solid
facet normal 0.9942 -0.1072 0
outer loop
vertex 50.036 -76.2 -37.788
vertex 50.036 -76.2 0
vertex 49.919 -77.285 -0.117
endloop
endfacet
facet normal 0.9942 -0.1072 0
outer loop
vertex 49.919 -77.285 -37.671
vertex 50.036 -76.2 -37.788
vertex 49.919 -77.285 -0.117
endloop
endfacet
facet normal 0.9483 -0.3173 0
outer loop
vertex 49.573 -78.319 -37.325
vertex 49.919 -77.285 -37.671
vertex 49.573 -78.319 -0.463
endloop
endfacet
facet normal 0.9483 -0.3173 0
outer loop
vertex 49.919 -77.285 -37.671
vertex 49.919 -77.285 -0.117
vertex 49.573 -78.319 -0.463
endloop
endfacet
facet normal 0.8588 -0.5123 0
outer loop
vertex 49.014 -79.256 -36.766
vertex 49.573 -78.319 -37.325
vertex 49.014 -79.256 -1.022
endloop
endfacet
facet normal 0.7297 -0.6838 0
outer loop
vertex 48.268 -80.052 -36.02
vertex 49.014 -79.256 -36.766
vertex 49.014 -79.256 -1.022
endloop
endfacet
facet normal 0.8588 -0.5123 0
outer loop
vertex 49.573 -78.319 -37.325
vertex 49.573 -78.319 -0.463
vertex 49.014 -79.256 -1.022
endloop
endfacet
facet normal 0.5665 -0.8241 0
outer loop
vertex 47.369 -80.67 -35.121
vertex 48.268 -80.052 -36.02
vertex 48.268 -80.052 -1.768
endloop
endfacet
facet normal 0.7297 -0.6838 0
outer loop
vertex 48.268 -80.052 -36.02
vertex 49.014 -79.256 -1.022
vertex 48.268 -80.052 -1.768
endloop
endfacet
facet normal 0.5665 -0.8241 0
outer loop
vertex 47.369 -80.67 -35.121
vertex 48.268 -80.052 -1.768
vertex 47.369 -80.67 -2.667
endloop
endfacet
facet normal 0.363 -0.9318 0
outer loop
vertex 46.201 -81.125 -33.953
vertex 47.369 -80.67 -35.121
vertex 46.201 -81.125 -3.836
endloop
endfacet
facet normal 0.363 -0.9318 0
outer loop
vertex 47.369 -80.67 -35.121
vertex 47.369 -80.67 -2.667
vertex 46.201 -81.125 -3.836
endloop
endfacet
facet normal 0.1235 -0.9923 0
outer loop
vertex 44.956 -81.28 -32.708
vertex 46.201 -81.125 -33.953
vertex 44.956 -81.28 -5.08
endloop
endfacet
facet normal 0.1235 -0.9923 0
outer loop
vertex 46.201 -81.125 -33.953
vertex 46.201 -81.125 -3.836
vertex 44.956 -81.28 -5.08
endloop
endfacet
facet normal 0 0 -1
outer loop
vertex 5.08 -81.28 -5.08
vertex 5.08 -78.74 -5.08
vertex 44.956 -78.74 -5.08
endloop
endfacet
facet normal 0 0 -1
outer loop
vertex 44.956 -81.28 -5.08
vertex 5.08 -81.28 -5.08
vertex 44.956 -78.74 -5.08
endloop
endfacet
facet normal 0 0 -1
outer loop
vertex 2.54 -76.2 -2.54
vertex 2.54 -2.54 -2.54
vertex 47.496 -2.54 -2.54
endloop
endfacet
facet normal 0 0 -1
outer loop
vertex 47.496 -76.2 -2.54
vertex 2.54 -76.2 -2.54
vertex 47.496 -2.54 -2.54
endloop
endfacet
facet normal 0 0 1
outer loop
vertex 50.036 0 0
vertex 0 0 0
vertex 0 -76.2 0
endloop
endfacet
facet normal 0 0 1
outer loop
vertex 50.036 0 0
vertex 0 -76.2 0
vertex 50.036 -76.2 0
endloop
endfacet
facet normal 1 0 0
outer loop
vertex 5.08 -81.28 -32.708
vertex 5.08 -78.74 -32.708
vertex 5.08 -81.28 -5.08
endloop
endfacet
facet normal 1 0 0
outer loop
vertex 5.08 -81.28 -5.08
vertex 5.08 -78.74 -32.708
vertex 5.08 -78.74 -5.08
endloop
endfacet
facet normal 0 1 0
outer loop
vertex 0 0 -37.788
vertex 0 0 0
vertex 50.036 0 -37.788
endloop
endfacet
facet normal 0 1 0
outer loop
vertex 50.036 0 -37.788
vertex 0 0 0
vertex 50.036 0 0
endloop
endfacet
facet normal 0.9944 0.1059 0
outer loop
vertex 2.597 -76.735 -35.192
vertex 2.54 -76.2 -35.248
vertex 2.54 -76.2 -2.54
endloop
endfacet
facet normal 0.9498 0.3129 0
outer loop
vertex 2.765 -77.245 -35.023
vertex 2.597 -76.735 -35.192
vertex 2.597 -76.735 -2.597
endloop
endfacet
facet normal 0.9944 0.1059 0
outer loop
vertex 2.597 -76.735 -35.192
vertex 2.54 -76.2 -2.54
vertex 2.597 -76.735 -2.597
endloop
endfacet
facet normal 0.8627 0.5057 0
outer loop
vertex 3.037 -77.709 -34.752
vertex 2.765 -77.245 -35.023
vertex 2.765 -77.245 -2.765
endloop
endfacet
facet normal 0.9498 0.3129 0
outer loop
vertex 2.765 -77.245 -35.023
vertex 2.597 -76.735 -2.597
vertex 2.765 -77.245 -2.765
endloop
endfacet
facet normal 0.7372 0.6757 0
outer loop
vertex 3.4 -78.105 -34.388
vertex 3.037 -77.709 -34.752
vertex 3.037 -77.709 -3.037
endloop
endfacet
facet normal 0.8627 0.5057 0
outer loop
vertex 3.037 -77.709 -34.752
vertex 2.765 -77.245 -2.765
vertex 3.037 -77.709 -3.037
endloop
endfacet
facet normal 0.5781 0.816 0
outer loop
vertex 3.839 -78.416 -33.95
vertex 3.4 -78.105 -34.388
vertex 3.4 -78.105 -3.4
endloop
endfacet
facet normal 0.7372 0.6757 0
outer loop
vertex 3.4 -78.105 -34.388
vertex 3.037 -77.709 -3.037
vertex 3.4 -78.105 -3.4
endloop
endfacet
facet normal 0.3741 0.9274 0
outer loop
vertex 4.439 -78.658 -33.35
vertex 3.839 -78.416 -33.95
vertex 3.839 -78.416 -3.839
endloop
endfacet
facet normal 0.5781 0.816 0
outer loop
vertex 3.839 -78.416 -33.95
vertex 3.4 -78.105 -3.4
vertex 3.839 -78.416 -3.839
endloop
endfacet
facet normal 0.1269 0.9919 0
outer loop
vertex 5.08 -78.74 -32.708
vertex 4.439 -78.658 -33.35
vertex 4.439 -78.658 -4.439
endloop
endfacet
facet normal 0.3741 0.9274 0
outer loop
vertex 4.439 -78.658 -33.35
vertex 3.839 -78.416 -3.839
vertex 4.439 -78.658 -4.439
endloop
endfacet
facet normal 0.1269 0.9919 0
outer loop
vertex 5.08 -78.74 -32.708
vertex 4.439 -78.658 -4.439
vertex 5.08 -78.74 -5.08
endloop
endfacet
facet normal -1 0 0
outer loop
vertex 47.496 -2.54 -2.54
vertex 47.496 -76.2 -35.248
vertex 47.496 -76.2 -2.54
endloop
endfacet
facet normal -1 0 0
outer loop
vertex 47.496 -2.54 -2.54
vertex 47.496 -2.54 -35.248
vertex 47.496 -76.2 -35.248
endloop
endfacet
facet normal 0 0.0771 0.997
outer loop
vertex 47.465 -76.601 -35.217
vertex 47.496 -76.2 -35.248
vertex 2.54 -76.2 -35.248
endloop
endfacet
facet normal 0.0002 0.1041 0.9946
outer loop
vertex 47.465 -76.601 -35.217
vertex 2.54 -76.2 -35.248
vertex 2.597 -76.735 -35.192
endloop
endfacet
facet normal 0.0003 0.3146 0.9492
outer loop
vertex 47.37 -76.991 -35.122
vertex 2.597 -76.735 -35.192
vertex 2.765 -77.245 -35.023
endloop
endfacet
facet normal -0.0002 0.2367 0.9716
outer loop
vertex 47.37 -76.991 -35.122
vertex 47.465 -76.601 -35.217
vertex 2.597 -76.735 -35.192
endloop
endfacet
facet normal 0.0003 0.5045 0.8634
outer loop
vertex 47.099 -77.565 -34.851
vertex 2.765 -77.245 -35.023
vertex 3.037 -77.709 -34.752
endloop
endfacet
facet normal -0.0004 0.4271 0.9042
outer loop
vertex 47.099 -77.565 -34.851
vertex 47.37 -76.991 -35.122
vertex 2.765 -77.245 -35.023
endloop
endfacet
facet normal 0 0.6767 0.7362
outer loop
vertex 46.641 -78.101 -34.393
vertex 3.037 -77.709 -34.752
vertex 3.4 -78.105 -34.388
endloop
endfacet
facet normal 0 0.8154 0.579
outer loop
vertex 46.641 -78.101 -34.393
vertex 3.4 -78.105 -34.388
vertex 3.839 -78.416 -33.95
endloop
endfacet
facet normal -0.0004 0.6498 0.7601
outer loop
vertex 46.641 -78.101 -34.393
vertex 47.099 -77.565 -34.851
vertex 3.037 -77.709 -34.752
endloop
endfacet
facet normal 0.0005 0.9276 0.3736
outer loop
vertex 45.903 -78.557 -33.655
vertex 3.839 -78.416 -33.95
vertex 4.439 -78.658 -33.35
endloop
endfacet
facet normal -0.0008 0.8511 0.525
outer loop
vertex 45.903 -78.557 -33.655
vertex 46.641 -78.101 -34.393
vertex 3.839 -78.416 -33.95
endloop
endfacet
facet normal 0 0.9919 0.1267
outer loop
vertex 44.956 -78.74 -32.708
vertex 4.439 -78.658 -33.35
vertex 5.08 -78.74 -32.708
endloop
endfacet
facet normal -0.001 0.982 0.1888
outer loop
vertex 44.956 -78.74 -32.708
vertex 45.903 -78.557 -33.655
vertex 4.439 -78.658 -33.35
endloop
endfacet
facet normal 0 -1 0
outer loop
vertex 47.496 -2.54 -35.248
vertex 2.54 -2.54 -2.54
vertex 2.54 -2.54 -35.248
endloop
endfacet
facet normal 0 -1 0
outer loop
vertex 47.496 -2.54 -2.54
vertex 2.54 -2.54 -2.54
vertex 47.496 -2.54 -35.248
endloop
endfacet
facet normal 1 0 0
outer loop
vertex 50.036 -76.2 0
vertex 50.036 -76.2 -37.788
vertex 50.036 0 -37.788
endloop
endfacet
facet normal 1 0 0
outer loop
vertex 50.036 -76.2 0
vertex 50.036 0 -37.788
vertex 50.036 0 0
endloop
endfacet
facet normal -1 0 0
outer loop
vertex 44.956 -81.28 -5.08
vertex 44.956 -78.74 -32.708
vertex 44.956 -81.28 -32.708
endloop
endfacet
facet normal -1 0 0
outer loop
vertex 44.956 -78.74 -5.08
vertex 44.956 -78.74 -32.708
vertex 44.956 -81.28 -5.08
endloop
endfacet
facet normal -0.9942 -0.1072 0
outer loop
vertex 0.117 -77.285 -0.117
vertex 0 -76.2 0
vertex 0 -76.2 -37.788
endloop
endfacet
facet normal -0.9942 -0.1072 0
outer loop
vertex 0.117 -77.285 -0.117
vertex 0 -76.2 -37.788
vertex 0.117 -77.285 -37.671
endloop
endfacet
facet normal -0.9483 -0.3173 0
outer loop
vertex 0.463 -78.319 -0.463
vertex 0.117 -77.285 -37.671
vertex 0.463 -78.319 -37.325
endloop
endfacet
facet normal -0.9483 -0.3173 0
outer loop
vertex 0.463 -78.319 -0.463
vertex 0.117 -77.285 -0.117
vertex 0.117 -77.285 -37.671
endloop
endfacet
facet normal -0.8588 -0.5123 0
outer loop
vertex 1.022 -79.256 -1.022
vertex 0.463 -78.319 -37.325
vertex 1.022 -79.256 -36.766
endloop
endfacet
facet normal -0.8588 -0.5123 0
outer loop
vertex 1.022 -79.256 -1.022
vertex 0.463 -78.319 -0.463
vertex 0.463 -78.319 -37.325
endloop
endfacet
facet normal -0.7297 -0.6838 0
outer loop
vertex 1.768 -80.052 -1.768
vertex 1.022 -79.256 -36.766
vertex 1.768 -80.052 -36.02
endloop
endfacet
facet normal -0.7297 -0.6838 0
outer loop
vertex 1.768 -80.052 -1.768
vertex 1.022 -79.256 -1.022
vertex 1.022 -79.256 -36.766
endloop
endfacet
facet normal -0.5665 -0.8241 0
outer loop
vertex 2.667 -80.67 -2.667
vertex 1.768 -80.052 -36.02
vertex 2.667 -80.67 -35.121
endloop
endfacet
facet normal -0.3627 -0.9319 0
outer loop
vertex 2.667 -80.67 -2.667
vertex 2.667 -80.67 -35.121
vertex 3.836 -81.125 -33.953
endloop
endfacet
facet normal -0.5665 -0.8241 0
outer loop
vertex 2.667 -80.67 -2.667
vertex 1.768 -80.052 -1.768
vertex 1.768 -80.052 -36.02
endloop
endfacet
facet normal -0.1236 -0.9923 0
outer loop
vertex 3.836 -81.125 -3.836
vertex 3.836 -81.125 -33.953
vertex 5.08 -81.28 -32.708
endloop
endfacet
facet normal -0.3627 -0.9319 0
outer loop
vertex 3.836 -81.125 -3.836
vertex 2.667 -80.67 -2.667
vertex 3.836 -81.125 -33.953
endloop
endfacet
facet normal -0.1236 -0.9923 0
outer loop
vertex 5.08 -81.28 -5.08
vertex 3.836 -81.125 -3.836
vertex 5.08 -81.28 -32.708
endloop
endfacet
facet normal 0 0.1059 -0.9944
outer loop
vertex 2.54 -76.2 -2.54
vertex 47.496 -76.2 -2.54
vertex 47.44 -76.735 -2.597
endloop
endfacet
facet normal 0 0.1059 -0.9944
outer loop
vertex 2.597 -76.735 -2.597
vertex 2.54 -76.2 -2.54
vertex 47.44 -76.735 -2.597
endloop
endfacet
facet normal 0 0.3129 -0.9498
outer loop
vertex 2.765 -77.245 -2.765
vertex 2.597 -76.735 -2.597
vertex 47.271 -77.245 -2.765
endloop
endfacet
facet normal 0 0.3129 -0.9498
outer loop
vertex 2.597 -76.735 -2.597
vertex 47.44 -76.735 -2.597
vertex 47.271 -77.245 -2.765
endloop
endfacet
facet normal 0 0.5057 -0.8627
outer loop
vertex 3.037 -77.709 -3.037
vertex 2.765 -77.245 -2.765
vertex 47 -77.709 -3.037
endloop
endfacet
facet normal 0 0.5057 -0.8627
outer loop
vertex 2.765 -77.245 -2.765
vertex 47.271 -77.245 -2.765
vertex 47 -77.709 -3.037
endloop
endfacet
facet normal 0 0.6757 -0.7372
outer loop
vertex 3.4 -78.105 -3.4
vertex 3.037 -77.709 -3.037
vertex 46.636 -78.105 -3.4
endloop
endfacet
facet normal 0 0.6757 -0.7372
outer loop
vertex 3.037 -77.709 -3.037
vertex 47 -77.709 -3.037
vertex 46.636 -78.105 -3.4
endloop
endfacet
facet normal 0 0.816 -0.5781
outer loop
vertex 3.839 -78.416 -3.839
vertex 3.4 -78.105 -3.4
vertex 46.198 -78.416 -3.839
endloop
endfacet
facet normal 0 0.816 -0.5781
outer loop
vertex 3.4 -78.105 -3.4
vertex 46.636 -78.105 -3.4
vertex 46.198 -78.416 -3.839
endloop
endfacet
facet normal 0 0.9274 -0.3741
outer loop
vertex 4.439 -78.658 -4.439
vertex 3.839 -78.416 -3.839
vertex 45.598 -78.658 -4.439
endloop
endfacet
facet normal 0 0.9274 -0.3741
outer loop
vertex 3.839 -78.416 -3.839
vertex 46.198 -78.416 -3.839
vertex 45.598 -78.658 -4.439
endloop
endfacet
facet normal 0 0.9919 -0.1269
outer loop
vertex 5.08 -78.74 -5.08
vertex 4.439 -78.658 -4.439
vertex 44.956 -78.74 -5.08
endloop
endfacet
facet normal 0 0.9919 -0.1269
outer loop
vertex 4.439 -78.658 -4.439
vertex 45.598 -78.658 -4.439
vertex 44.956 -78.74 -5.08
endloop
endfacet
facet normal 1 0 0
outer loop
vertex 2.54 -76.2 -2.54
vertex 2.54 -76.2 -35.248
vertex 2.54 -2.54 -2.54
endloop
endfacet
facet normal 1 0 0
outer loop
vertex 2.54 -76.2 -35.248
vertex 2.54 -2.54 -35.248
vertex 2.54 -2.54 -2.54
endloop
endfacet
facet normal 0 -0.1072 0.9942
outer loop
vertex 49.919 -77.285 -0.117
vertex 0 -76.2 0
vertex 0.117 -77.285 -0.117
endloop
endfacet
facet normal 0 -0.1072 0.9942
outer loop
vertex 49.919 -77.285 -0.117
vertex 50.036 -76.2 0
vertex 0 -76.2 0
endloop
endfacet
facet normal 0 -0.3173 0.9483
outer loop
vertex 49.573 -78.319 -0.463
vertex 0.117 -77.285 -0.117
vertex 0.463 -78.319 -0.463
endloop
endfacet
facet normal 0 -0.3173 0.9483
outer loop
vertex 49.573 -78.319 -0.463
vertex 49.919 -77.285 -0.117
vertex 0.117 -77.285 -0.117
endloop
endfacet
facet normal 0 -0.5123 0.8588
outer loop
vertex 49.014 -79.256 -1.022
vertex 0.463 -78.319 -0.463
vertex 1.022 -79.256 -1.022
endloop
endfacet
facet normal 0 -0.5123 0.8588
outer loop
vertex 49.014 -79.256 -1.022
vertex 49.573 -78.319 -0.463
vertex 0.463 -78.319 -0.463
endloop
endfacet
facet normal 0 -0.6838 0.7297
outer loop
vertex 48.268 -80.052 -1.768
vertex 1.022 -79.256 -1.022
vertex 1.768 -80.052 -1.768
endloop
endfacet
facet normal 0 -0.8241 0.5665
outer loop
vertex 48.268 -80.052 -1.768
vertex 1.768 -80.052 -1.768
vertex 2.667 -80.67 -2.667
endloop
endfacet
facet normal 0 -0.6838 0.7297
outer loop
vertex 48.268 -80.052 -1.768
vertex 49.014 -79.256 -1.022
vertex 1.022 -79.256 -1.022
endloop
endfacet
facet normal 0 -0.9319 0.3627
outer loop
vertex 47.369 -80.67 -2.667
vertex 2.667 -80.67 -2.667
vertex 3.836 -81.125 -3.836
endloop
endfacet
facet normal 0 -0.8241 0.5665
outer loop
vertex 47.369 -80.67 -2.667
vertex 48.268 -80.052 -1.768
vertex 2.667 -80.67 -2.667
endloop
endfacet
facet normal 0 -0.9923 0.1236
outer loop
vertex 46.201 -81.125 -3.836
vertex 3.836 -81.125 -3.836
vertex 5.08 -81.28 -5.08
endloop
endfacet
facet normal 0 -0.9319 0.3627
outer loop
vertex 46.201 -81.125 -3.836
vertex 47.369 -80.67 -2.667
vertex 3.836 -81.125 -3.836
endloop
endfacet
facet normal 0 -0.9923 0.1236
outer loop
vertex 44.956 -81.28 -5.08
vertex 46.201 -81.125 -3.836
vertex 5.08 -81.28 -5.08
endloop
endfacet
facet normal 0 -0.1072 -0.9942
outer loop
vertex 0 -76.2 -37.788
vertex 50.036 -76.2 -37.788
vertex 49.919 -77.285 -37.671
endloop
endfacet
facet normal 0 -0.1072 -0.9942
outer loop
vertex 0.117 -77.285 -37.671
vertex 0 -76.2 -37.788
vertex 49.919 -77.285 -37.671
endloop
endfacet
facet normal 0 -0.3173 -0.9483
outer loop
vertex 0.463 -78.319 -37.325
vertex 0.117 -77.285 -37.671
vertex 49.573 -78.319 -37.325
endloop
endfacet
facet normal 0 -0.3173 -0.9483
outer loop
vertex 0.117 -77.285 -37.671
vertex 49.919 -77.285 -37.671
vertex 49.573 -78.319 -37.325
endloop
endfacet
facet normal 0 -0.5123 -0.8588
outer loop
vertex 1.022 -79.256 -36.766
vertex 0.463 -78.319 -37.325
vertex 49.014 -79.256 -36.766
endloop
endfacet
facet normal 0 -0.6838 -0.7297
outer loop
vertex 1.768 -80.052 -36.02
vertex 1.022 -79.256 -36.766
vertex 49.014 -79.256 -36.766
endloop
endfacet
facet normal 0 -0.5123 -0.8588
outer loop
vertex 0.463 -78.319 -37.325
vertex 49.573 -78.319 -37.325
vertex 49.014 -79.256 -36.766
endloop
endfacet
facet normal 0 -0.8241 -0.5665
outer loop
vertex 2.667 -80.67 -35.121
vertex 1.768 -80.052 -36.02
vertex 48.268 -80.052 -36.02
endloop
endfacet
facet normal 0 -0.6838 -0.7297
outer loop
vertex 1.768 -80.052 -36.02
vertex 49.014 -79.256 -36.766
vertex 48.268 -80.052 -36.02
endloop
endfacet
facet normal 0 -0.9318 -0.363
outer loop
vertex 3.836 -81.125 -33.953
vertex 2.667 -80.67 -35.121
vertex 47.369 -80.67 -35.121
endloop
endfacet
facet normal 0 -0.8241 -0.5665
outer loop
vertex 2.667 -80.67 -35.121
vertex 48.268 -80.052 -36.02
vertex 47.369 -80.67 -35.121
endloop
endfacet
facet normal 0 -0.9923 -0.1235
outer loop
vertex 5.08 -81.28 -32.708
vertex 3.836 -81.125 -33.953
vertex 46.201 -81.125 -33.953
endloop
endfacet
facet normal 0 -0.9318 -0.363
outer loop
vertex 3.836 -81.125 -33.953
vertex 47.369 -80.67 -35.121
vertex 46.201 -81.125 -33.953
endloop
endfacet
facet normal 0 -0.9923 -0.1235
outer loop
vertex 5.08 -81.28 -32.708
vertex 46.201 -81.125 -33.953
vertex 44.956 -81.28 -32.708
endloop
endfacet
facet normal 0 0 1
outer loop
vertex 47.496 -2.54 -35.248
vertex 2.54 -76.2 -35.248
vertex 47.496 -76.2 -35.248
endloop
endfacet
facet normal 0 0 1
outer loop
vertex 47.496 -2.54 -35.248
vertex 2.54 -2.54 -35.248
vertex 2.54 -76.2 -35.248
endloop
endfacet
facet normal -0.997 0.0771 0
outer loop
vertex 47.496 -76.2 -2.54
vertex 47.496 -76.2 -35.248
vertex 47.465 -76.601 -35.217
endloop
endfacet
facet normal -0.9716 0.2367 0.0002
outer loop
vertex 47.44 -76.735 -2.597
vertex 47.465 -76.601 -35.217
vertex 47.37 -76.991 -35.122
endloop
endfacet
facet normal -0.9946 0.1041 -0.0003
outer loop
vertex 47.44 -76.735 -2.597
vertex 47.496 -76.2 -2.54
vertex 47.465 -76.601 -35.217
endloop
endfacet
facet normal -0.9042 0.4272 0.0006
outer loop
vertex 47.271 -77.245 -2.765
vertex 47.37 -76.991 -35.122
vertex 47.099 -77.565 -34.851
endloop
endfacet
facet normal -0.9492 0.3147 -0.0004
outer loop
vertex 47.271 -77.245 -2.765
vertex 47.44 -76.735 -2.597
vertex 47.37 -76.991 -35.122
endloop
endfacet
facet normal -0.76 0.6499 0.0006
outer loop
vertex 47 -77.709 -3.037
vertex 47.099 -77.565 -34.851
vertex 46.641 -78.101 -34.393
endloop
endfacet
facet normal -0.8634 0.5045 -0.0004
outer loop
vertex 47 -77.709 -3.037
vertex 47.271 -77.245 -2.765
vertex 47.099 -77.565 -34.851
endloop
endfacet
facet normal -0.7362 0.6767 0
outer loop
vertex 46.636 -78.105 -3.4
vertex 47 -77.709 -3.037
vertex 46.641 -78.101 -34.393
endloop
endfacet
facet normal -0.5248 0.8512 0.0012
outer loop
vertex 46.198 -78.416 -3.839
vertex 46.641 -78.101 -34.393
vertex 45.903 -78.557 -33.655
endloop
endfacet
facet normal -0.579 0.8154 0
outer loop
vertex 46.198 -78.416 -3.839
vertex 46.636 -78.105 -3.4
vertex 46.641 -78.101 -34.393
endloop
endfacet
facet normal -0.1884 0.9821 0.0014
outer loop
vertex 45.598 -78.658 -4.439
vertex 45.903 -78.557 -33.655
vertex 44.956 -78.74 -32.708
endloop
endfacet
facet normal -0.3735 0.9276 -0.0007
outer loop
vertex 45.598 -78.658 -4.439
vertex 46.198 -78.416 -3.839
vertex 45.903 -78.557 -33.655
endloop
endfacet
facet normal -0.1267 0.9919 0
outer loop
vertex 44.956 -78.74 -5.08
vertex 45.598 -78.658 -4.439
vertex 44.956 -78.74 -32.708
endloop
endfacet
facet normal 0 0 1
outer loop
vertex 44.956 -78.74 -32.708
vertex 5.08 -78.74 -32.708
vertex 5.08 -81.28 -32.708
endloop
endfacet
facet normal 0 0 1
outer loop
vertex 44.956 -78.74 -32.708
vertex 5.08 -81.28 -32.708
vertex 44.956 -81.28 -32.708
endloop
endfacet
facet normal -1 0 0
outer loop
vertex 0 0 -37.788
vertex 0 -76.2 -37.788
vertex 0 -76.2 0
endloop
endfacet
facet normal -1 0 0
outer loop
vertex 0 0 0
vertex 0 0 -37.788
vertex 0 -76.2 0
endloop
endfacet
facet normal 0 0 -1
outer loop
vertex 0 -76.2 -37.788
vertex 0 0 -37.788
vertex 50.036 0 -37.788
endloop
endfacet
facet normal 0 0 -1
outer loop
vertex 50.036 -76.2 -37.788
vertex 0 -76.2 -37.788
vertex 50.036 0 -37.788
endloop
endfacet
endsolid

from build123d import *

# Parameters (mm, degrees)
F0_W     = 50.0364415348
F0_H     = 37.788476795
F1_DEPTH = 81.28
F2_R     = 5.08
F3_T     = -2.54


# Not quite as in the source:
# - a shell that OpenCascade refuses in one call is made with other operations: the cavity is built on its own and cut out


with BuildPart() as f1:
    # F0 (on Front) → F1 (new body)
    with BuildSketch(Plane.XZ):
        with Locations((25.0182207674, -18.8942383975)):
            Rectangle(F0_W, F0_H)
    extrude(amount=F1_DEPTH)

    # F2
    f2_edges = [f1.edges().sort_by_distance(p)[0] for p in [
        (25.018221, -81.28, 0),
        (0, -81.28, -18.894238),
        (25.018221, -81.28, -37.788477),
        (50.036442, -81.28, -18.894238),
    ]]
    fillet(f2_edges, radius=F2_R)

    # F3: a shell. OpenCascade refuses it in one call, so the cavity is built on its own and cut out:
    # the body offset inwards by the wall thickness, plus a prism from it out through each open face.
    f3_core = offset(f1.part, amount=F3_T, mode=Mode.PRIVATE)
    f3_exits = [f3_core.faces().sort_by_distance(p)[0] for p in [
        (25.018221, -78.74, -18.894238),
    ]]
    add(f3_core, mode=Mode.SUBTRACT)
    extrude(f3_exits, amount=-F3_T, mode=Mode.SUBTRACT)


solid = f1.part
